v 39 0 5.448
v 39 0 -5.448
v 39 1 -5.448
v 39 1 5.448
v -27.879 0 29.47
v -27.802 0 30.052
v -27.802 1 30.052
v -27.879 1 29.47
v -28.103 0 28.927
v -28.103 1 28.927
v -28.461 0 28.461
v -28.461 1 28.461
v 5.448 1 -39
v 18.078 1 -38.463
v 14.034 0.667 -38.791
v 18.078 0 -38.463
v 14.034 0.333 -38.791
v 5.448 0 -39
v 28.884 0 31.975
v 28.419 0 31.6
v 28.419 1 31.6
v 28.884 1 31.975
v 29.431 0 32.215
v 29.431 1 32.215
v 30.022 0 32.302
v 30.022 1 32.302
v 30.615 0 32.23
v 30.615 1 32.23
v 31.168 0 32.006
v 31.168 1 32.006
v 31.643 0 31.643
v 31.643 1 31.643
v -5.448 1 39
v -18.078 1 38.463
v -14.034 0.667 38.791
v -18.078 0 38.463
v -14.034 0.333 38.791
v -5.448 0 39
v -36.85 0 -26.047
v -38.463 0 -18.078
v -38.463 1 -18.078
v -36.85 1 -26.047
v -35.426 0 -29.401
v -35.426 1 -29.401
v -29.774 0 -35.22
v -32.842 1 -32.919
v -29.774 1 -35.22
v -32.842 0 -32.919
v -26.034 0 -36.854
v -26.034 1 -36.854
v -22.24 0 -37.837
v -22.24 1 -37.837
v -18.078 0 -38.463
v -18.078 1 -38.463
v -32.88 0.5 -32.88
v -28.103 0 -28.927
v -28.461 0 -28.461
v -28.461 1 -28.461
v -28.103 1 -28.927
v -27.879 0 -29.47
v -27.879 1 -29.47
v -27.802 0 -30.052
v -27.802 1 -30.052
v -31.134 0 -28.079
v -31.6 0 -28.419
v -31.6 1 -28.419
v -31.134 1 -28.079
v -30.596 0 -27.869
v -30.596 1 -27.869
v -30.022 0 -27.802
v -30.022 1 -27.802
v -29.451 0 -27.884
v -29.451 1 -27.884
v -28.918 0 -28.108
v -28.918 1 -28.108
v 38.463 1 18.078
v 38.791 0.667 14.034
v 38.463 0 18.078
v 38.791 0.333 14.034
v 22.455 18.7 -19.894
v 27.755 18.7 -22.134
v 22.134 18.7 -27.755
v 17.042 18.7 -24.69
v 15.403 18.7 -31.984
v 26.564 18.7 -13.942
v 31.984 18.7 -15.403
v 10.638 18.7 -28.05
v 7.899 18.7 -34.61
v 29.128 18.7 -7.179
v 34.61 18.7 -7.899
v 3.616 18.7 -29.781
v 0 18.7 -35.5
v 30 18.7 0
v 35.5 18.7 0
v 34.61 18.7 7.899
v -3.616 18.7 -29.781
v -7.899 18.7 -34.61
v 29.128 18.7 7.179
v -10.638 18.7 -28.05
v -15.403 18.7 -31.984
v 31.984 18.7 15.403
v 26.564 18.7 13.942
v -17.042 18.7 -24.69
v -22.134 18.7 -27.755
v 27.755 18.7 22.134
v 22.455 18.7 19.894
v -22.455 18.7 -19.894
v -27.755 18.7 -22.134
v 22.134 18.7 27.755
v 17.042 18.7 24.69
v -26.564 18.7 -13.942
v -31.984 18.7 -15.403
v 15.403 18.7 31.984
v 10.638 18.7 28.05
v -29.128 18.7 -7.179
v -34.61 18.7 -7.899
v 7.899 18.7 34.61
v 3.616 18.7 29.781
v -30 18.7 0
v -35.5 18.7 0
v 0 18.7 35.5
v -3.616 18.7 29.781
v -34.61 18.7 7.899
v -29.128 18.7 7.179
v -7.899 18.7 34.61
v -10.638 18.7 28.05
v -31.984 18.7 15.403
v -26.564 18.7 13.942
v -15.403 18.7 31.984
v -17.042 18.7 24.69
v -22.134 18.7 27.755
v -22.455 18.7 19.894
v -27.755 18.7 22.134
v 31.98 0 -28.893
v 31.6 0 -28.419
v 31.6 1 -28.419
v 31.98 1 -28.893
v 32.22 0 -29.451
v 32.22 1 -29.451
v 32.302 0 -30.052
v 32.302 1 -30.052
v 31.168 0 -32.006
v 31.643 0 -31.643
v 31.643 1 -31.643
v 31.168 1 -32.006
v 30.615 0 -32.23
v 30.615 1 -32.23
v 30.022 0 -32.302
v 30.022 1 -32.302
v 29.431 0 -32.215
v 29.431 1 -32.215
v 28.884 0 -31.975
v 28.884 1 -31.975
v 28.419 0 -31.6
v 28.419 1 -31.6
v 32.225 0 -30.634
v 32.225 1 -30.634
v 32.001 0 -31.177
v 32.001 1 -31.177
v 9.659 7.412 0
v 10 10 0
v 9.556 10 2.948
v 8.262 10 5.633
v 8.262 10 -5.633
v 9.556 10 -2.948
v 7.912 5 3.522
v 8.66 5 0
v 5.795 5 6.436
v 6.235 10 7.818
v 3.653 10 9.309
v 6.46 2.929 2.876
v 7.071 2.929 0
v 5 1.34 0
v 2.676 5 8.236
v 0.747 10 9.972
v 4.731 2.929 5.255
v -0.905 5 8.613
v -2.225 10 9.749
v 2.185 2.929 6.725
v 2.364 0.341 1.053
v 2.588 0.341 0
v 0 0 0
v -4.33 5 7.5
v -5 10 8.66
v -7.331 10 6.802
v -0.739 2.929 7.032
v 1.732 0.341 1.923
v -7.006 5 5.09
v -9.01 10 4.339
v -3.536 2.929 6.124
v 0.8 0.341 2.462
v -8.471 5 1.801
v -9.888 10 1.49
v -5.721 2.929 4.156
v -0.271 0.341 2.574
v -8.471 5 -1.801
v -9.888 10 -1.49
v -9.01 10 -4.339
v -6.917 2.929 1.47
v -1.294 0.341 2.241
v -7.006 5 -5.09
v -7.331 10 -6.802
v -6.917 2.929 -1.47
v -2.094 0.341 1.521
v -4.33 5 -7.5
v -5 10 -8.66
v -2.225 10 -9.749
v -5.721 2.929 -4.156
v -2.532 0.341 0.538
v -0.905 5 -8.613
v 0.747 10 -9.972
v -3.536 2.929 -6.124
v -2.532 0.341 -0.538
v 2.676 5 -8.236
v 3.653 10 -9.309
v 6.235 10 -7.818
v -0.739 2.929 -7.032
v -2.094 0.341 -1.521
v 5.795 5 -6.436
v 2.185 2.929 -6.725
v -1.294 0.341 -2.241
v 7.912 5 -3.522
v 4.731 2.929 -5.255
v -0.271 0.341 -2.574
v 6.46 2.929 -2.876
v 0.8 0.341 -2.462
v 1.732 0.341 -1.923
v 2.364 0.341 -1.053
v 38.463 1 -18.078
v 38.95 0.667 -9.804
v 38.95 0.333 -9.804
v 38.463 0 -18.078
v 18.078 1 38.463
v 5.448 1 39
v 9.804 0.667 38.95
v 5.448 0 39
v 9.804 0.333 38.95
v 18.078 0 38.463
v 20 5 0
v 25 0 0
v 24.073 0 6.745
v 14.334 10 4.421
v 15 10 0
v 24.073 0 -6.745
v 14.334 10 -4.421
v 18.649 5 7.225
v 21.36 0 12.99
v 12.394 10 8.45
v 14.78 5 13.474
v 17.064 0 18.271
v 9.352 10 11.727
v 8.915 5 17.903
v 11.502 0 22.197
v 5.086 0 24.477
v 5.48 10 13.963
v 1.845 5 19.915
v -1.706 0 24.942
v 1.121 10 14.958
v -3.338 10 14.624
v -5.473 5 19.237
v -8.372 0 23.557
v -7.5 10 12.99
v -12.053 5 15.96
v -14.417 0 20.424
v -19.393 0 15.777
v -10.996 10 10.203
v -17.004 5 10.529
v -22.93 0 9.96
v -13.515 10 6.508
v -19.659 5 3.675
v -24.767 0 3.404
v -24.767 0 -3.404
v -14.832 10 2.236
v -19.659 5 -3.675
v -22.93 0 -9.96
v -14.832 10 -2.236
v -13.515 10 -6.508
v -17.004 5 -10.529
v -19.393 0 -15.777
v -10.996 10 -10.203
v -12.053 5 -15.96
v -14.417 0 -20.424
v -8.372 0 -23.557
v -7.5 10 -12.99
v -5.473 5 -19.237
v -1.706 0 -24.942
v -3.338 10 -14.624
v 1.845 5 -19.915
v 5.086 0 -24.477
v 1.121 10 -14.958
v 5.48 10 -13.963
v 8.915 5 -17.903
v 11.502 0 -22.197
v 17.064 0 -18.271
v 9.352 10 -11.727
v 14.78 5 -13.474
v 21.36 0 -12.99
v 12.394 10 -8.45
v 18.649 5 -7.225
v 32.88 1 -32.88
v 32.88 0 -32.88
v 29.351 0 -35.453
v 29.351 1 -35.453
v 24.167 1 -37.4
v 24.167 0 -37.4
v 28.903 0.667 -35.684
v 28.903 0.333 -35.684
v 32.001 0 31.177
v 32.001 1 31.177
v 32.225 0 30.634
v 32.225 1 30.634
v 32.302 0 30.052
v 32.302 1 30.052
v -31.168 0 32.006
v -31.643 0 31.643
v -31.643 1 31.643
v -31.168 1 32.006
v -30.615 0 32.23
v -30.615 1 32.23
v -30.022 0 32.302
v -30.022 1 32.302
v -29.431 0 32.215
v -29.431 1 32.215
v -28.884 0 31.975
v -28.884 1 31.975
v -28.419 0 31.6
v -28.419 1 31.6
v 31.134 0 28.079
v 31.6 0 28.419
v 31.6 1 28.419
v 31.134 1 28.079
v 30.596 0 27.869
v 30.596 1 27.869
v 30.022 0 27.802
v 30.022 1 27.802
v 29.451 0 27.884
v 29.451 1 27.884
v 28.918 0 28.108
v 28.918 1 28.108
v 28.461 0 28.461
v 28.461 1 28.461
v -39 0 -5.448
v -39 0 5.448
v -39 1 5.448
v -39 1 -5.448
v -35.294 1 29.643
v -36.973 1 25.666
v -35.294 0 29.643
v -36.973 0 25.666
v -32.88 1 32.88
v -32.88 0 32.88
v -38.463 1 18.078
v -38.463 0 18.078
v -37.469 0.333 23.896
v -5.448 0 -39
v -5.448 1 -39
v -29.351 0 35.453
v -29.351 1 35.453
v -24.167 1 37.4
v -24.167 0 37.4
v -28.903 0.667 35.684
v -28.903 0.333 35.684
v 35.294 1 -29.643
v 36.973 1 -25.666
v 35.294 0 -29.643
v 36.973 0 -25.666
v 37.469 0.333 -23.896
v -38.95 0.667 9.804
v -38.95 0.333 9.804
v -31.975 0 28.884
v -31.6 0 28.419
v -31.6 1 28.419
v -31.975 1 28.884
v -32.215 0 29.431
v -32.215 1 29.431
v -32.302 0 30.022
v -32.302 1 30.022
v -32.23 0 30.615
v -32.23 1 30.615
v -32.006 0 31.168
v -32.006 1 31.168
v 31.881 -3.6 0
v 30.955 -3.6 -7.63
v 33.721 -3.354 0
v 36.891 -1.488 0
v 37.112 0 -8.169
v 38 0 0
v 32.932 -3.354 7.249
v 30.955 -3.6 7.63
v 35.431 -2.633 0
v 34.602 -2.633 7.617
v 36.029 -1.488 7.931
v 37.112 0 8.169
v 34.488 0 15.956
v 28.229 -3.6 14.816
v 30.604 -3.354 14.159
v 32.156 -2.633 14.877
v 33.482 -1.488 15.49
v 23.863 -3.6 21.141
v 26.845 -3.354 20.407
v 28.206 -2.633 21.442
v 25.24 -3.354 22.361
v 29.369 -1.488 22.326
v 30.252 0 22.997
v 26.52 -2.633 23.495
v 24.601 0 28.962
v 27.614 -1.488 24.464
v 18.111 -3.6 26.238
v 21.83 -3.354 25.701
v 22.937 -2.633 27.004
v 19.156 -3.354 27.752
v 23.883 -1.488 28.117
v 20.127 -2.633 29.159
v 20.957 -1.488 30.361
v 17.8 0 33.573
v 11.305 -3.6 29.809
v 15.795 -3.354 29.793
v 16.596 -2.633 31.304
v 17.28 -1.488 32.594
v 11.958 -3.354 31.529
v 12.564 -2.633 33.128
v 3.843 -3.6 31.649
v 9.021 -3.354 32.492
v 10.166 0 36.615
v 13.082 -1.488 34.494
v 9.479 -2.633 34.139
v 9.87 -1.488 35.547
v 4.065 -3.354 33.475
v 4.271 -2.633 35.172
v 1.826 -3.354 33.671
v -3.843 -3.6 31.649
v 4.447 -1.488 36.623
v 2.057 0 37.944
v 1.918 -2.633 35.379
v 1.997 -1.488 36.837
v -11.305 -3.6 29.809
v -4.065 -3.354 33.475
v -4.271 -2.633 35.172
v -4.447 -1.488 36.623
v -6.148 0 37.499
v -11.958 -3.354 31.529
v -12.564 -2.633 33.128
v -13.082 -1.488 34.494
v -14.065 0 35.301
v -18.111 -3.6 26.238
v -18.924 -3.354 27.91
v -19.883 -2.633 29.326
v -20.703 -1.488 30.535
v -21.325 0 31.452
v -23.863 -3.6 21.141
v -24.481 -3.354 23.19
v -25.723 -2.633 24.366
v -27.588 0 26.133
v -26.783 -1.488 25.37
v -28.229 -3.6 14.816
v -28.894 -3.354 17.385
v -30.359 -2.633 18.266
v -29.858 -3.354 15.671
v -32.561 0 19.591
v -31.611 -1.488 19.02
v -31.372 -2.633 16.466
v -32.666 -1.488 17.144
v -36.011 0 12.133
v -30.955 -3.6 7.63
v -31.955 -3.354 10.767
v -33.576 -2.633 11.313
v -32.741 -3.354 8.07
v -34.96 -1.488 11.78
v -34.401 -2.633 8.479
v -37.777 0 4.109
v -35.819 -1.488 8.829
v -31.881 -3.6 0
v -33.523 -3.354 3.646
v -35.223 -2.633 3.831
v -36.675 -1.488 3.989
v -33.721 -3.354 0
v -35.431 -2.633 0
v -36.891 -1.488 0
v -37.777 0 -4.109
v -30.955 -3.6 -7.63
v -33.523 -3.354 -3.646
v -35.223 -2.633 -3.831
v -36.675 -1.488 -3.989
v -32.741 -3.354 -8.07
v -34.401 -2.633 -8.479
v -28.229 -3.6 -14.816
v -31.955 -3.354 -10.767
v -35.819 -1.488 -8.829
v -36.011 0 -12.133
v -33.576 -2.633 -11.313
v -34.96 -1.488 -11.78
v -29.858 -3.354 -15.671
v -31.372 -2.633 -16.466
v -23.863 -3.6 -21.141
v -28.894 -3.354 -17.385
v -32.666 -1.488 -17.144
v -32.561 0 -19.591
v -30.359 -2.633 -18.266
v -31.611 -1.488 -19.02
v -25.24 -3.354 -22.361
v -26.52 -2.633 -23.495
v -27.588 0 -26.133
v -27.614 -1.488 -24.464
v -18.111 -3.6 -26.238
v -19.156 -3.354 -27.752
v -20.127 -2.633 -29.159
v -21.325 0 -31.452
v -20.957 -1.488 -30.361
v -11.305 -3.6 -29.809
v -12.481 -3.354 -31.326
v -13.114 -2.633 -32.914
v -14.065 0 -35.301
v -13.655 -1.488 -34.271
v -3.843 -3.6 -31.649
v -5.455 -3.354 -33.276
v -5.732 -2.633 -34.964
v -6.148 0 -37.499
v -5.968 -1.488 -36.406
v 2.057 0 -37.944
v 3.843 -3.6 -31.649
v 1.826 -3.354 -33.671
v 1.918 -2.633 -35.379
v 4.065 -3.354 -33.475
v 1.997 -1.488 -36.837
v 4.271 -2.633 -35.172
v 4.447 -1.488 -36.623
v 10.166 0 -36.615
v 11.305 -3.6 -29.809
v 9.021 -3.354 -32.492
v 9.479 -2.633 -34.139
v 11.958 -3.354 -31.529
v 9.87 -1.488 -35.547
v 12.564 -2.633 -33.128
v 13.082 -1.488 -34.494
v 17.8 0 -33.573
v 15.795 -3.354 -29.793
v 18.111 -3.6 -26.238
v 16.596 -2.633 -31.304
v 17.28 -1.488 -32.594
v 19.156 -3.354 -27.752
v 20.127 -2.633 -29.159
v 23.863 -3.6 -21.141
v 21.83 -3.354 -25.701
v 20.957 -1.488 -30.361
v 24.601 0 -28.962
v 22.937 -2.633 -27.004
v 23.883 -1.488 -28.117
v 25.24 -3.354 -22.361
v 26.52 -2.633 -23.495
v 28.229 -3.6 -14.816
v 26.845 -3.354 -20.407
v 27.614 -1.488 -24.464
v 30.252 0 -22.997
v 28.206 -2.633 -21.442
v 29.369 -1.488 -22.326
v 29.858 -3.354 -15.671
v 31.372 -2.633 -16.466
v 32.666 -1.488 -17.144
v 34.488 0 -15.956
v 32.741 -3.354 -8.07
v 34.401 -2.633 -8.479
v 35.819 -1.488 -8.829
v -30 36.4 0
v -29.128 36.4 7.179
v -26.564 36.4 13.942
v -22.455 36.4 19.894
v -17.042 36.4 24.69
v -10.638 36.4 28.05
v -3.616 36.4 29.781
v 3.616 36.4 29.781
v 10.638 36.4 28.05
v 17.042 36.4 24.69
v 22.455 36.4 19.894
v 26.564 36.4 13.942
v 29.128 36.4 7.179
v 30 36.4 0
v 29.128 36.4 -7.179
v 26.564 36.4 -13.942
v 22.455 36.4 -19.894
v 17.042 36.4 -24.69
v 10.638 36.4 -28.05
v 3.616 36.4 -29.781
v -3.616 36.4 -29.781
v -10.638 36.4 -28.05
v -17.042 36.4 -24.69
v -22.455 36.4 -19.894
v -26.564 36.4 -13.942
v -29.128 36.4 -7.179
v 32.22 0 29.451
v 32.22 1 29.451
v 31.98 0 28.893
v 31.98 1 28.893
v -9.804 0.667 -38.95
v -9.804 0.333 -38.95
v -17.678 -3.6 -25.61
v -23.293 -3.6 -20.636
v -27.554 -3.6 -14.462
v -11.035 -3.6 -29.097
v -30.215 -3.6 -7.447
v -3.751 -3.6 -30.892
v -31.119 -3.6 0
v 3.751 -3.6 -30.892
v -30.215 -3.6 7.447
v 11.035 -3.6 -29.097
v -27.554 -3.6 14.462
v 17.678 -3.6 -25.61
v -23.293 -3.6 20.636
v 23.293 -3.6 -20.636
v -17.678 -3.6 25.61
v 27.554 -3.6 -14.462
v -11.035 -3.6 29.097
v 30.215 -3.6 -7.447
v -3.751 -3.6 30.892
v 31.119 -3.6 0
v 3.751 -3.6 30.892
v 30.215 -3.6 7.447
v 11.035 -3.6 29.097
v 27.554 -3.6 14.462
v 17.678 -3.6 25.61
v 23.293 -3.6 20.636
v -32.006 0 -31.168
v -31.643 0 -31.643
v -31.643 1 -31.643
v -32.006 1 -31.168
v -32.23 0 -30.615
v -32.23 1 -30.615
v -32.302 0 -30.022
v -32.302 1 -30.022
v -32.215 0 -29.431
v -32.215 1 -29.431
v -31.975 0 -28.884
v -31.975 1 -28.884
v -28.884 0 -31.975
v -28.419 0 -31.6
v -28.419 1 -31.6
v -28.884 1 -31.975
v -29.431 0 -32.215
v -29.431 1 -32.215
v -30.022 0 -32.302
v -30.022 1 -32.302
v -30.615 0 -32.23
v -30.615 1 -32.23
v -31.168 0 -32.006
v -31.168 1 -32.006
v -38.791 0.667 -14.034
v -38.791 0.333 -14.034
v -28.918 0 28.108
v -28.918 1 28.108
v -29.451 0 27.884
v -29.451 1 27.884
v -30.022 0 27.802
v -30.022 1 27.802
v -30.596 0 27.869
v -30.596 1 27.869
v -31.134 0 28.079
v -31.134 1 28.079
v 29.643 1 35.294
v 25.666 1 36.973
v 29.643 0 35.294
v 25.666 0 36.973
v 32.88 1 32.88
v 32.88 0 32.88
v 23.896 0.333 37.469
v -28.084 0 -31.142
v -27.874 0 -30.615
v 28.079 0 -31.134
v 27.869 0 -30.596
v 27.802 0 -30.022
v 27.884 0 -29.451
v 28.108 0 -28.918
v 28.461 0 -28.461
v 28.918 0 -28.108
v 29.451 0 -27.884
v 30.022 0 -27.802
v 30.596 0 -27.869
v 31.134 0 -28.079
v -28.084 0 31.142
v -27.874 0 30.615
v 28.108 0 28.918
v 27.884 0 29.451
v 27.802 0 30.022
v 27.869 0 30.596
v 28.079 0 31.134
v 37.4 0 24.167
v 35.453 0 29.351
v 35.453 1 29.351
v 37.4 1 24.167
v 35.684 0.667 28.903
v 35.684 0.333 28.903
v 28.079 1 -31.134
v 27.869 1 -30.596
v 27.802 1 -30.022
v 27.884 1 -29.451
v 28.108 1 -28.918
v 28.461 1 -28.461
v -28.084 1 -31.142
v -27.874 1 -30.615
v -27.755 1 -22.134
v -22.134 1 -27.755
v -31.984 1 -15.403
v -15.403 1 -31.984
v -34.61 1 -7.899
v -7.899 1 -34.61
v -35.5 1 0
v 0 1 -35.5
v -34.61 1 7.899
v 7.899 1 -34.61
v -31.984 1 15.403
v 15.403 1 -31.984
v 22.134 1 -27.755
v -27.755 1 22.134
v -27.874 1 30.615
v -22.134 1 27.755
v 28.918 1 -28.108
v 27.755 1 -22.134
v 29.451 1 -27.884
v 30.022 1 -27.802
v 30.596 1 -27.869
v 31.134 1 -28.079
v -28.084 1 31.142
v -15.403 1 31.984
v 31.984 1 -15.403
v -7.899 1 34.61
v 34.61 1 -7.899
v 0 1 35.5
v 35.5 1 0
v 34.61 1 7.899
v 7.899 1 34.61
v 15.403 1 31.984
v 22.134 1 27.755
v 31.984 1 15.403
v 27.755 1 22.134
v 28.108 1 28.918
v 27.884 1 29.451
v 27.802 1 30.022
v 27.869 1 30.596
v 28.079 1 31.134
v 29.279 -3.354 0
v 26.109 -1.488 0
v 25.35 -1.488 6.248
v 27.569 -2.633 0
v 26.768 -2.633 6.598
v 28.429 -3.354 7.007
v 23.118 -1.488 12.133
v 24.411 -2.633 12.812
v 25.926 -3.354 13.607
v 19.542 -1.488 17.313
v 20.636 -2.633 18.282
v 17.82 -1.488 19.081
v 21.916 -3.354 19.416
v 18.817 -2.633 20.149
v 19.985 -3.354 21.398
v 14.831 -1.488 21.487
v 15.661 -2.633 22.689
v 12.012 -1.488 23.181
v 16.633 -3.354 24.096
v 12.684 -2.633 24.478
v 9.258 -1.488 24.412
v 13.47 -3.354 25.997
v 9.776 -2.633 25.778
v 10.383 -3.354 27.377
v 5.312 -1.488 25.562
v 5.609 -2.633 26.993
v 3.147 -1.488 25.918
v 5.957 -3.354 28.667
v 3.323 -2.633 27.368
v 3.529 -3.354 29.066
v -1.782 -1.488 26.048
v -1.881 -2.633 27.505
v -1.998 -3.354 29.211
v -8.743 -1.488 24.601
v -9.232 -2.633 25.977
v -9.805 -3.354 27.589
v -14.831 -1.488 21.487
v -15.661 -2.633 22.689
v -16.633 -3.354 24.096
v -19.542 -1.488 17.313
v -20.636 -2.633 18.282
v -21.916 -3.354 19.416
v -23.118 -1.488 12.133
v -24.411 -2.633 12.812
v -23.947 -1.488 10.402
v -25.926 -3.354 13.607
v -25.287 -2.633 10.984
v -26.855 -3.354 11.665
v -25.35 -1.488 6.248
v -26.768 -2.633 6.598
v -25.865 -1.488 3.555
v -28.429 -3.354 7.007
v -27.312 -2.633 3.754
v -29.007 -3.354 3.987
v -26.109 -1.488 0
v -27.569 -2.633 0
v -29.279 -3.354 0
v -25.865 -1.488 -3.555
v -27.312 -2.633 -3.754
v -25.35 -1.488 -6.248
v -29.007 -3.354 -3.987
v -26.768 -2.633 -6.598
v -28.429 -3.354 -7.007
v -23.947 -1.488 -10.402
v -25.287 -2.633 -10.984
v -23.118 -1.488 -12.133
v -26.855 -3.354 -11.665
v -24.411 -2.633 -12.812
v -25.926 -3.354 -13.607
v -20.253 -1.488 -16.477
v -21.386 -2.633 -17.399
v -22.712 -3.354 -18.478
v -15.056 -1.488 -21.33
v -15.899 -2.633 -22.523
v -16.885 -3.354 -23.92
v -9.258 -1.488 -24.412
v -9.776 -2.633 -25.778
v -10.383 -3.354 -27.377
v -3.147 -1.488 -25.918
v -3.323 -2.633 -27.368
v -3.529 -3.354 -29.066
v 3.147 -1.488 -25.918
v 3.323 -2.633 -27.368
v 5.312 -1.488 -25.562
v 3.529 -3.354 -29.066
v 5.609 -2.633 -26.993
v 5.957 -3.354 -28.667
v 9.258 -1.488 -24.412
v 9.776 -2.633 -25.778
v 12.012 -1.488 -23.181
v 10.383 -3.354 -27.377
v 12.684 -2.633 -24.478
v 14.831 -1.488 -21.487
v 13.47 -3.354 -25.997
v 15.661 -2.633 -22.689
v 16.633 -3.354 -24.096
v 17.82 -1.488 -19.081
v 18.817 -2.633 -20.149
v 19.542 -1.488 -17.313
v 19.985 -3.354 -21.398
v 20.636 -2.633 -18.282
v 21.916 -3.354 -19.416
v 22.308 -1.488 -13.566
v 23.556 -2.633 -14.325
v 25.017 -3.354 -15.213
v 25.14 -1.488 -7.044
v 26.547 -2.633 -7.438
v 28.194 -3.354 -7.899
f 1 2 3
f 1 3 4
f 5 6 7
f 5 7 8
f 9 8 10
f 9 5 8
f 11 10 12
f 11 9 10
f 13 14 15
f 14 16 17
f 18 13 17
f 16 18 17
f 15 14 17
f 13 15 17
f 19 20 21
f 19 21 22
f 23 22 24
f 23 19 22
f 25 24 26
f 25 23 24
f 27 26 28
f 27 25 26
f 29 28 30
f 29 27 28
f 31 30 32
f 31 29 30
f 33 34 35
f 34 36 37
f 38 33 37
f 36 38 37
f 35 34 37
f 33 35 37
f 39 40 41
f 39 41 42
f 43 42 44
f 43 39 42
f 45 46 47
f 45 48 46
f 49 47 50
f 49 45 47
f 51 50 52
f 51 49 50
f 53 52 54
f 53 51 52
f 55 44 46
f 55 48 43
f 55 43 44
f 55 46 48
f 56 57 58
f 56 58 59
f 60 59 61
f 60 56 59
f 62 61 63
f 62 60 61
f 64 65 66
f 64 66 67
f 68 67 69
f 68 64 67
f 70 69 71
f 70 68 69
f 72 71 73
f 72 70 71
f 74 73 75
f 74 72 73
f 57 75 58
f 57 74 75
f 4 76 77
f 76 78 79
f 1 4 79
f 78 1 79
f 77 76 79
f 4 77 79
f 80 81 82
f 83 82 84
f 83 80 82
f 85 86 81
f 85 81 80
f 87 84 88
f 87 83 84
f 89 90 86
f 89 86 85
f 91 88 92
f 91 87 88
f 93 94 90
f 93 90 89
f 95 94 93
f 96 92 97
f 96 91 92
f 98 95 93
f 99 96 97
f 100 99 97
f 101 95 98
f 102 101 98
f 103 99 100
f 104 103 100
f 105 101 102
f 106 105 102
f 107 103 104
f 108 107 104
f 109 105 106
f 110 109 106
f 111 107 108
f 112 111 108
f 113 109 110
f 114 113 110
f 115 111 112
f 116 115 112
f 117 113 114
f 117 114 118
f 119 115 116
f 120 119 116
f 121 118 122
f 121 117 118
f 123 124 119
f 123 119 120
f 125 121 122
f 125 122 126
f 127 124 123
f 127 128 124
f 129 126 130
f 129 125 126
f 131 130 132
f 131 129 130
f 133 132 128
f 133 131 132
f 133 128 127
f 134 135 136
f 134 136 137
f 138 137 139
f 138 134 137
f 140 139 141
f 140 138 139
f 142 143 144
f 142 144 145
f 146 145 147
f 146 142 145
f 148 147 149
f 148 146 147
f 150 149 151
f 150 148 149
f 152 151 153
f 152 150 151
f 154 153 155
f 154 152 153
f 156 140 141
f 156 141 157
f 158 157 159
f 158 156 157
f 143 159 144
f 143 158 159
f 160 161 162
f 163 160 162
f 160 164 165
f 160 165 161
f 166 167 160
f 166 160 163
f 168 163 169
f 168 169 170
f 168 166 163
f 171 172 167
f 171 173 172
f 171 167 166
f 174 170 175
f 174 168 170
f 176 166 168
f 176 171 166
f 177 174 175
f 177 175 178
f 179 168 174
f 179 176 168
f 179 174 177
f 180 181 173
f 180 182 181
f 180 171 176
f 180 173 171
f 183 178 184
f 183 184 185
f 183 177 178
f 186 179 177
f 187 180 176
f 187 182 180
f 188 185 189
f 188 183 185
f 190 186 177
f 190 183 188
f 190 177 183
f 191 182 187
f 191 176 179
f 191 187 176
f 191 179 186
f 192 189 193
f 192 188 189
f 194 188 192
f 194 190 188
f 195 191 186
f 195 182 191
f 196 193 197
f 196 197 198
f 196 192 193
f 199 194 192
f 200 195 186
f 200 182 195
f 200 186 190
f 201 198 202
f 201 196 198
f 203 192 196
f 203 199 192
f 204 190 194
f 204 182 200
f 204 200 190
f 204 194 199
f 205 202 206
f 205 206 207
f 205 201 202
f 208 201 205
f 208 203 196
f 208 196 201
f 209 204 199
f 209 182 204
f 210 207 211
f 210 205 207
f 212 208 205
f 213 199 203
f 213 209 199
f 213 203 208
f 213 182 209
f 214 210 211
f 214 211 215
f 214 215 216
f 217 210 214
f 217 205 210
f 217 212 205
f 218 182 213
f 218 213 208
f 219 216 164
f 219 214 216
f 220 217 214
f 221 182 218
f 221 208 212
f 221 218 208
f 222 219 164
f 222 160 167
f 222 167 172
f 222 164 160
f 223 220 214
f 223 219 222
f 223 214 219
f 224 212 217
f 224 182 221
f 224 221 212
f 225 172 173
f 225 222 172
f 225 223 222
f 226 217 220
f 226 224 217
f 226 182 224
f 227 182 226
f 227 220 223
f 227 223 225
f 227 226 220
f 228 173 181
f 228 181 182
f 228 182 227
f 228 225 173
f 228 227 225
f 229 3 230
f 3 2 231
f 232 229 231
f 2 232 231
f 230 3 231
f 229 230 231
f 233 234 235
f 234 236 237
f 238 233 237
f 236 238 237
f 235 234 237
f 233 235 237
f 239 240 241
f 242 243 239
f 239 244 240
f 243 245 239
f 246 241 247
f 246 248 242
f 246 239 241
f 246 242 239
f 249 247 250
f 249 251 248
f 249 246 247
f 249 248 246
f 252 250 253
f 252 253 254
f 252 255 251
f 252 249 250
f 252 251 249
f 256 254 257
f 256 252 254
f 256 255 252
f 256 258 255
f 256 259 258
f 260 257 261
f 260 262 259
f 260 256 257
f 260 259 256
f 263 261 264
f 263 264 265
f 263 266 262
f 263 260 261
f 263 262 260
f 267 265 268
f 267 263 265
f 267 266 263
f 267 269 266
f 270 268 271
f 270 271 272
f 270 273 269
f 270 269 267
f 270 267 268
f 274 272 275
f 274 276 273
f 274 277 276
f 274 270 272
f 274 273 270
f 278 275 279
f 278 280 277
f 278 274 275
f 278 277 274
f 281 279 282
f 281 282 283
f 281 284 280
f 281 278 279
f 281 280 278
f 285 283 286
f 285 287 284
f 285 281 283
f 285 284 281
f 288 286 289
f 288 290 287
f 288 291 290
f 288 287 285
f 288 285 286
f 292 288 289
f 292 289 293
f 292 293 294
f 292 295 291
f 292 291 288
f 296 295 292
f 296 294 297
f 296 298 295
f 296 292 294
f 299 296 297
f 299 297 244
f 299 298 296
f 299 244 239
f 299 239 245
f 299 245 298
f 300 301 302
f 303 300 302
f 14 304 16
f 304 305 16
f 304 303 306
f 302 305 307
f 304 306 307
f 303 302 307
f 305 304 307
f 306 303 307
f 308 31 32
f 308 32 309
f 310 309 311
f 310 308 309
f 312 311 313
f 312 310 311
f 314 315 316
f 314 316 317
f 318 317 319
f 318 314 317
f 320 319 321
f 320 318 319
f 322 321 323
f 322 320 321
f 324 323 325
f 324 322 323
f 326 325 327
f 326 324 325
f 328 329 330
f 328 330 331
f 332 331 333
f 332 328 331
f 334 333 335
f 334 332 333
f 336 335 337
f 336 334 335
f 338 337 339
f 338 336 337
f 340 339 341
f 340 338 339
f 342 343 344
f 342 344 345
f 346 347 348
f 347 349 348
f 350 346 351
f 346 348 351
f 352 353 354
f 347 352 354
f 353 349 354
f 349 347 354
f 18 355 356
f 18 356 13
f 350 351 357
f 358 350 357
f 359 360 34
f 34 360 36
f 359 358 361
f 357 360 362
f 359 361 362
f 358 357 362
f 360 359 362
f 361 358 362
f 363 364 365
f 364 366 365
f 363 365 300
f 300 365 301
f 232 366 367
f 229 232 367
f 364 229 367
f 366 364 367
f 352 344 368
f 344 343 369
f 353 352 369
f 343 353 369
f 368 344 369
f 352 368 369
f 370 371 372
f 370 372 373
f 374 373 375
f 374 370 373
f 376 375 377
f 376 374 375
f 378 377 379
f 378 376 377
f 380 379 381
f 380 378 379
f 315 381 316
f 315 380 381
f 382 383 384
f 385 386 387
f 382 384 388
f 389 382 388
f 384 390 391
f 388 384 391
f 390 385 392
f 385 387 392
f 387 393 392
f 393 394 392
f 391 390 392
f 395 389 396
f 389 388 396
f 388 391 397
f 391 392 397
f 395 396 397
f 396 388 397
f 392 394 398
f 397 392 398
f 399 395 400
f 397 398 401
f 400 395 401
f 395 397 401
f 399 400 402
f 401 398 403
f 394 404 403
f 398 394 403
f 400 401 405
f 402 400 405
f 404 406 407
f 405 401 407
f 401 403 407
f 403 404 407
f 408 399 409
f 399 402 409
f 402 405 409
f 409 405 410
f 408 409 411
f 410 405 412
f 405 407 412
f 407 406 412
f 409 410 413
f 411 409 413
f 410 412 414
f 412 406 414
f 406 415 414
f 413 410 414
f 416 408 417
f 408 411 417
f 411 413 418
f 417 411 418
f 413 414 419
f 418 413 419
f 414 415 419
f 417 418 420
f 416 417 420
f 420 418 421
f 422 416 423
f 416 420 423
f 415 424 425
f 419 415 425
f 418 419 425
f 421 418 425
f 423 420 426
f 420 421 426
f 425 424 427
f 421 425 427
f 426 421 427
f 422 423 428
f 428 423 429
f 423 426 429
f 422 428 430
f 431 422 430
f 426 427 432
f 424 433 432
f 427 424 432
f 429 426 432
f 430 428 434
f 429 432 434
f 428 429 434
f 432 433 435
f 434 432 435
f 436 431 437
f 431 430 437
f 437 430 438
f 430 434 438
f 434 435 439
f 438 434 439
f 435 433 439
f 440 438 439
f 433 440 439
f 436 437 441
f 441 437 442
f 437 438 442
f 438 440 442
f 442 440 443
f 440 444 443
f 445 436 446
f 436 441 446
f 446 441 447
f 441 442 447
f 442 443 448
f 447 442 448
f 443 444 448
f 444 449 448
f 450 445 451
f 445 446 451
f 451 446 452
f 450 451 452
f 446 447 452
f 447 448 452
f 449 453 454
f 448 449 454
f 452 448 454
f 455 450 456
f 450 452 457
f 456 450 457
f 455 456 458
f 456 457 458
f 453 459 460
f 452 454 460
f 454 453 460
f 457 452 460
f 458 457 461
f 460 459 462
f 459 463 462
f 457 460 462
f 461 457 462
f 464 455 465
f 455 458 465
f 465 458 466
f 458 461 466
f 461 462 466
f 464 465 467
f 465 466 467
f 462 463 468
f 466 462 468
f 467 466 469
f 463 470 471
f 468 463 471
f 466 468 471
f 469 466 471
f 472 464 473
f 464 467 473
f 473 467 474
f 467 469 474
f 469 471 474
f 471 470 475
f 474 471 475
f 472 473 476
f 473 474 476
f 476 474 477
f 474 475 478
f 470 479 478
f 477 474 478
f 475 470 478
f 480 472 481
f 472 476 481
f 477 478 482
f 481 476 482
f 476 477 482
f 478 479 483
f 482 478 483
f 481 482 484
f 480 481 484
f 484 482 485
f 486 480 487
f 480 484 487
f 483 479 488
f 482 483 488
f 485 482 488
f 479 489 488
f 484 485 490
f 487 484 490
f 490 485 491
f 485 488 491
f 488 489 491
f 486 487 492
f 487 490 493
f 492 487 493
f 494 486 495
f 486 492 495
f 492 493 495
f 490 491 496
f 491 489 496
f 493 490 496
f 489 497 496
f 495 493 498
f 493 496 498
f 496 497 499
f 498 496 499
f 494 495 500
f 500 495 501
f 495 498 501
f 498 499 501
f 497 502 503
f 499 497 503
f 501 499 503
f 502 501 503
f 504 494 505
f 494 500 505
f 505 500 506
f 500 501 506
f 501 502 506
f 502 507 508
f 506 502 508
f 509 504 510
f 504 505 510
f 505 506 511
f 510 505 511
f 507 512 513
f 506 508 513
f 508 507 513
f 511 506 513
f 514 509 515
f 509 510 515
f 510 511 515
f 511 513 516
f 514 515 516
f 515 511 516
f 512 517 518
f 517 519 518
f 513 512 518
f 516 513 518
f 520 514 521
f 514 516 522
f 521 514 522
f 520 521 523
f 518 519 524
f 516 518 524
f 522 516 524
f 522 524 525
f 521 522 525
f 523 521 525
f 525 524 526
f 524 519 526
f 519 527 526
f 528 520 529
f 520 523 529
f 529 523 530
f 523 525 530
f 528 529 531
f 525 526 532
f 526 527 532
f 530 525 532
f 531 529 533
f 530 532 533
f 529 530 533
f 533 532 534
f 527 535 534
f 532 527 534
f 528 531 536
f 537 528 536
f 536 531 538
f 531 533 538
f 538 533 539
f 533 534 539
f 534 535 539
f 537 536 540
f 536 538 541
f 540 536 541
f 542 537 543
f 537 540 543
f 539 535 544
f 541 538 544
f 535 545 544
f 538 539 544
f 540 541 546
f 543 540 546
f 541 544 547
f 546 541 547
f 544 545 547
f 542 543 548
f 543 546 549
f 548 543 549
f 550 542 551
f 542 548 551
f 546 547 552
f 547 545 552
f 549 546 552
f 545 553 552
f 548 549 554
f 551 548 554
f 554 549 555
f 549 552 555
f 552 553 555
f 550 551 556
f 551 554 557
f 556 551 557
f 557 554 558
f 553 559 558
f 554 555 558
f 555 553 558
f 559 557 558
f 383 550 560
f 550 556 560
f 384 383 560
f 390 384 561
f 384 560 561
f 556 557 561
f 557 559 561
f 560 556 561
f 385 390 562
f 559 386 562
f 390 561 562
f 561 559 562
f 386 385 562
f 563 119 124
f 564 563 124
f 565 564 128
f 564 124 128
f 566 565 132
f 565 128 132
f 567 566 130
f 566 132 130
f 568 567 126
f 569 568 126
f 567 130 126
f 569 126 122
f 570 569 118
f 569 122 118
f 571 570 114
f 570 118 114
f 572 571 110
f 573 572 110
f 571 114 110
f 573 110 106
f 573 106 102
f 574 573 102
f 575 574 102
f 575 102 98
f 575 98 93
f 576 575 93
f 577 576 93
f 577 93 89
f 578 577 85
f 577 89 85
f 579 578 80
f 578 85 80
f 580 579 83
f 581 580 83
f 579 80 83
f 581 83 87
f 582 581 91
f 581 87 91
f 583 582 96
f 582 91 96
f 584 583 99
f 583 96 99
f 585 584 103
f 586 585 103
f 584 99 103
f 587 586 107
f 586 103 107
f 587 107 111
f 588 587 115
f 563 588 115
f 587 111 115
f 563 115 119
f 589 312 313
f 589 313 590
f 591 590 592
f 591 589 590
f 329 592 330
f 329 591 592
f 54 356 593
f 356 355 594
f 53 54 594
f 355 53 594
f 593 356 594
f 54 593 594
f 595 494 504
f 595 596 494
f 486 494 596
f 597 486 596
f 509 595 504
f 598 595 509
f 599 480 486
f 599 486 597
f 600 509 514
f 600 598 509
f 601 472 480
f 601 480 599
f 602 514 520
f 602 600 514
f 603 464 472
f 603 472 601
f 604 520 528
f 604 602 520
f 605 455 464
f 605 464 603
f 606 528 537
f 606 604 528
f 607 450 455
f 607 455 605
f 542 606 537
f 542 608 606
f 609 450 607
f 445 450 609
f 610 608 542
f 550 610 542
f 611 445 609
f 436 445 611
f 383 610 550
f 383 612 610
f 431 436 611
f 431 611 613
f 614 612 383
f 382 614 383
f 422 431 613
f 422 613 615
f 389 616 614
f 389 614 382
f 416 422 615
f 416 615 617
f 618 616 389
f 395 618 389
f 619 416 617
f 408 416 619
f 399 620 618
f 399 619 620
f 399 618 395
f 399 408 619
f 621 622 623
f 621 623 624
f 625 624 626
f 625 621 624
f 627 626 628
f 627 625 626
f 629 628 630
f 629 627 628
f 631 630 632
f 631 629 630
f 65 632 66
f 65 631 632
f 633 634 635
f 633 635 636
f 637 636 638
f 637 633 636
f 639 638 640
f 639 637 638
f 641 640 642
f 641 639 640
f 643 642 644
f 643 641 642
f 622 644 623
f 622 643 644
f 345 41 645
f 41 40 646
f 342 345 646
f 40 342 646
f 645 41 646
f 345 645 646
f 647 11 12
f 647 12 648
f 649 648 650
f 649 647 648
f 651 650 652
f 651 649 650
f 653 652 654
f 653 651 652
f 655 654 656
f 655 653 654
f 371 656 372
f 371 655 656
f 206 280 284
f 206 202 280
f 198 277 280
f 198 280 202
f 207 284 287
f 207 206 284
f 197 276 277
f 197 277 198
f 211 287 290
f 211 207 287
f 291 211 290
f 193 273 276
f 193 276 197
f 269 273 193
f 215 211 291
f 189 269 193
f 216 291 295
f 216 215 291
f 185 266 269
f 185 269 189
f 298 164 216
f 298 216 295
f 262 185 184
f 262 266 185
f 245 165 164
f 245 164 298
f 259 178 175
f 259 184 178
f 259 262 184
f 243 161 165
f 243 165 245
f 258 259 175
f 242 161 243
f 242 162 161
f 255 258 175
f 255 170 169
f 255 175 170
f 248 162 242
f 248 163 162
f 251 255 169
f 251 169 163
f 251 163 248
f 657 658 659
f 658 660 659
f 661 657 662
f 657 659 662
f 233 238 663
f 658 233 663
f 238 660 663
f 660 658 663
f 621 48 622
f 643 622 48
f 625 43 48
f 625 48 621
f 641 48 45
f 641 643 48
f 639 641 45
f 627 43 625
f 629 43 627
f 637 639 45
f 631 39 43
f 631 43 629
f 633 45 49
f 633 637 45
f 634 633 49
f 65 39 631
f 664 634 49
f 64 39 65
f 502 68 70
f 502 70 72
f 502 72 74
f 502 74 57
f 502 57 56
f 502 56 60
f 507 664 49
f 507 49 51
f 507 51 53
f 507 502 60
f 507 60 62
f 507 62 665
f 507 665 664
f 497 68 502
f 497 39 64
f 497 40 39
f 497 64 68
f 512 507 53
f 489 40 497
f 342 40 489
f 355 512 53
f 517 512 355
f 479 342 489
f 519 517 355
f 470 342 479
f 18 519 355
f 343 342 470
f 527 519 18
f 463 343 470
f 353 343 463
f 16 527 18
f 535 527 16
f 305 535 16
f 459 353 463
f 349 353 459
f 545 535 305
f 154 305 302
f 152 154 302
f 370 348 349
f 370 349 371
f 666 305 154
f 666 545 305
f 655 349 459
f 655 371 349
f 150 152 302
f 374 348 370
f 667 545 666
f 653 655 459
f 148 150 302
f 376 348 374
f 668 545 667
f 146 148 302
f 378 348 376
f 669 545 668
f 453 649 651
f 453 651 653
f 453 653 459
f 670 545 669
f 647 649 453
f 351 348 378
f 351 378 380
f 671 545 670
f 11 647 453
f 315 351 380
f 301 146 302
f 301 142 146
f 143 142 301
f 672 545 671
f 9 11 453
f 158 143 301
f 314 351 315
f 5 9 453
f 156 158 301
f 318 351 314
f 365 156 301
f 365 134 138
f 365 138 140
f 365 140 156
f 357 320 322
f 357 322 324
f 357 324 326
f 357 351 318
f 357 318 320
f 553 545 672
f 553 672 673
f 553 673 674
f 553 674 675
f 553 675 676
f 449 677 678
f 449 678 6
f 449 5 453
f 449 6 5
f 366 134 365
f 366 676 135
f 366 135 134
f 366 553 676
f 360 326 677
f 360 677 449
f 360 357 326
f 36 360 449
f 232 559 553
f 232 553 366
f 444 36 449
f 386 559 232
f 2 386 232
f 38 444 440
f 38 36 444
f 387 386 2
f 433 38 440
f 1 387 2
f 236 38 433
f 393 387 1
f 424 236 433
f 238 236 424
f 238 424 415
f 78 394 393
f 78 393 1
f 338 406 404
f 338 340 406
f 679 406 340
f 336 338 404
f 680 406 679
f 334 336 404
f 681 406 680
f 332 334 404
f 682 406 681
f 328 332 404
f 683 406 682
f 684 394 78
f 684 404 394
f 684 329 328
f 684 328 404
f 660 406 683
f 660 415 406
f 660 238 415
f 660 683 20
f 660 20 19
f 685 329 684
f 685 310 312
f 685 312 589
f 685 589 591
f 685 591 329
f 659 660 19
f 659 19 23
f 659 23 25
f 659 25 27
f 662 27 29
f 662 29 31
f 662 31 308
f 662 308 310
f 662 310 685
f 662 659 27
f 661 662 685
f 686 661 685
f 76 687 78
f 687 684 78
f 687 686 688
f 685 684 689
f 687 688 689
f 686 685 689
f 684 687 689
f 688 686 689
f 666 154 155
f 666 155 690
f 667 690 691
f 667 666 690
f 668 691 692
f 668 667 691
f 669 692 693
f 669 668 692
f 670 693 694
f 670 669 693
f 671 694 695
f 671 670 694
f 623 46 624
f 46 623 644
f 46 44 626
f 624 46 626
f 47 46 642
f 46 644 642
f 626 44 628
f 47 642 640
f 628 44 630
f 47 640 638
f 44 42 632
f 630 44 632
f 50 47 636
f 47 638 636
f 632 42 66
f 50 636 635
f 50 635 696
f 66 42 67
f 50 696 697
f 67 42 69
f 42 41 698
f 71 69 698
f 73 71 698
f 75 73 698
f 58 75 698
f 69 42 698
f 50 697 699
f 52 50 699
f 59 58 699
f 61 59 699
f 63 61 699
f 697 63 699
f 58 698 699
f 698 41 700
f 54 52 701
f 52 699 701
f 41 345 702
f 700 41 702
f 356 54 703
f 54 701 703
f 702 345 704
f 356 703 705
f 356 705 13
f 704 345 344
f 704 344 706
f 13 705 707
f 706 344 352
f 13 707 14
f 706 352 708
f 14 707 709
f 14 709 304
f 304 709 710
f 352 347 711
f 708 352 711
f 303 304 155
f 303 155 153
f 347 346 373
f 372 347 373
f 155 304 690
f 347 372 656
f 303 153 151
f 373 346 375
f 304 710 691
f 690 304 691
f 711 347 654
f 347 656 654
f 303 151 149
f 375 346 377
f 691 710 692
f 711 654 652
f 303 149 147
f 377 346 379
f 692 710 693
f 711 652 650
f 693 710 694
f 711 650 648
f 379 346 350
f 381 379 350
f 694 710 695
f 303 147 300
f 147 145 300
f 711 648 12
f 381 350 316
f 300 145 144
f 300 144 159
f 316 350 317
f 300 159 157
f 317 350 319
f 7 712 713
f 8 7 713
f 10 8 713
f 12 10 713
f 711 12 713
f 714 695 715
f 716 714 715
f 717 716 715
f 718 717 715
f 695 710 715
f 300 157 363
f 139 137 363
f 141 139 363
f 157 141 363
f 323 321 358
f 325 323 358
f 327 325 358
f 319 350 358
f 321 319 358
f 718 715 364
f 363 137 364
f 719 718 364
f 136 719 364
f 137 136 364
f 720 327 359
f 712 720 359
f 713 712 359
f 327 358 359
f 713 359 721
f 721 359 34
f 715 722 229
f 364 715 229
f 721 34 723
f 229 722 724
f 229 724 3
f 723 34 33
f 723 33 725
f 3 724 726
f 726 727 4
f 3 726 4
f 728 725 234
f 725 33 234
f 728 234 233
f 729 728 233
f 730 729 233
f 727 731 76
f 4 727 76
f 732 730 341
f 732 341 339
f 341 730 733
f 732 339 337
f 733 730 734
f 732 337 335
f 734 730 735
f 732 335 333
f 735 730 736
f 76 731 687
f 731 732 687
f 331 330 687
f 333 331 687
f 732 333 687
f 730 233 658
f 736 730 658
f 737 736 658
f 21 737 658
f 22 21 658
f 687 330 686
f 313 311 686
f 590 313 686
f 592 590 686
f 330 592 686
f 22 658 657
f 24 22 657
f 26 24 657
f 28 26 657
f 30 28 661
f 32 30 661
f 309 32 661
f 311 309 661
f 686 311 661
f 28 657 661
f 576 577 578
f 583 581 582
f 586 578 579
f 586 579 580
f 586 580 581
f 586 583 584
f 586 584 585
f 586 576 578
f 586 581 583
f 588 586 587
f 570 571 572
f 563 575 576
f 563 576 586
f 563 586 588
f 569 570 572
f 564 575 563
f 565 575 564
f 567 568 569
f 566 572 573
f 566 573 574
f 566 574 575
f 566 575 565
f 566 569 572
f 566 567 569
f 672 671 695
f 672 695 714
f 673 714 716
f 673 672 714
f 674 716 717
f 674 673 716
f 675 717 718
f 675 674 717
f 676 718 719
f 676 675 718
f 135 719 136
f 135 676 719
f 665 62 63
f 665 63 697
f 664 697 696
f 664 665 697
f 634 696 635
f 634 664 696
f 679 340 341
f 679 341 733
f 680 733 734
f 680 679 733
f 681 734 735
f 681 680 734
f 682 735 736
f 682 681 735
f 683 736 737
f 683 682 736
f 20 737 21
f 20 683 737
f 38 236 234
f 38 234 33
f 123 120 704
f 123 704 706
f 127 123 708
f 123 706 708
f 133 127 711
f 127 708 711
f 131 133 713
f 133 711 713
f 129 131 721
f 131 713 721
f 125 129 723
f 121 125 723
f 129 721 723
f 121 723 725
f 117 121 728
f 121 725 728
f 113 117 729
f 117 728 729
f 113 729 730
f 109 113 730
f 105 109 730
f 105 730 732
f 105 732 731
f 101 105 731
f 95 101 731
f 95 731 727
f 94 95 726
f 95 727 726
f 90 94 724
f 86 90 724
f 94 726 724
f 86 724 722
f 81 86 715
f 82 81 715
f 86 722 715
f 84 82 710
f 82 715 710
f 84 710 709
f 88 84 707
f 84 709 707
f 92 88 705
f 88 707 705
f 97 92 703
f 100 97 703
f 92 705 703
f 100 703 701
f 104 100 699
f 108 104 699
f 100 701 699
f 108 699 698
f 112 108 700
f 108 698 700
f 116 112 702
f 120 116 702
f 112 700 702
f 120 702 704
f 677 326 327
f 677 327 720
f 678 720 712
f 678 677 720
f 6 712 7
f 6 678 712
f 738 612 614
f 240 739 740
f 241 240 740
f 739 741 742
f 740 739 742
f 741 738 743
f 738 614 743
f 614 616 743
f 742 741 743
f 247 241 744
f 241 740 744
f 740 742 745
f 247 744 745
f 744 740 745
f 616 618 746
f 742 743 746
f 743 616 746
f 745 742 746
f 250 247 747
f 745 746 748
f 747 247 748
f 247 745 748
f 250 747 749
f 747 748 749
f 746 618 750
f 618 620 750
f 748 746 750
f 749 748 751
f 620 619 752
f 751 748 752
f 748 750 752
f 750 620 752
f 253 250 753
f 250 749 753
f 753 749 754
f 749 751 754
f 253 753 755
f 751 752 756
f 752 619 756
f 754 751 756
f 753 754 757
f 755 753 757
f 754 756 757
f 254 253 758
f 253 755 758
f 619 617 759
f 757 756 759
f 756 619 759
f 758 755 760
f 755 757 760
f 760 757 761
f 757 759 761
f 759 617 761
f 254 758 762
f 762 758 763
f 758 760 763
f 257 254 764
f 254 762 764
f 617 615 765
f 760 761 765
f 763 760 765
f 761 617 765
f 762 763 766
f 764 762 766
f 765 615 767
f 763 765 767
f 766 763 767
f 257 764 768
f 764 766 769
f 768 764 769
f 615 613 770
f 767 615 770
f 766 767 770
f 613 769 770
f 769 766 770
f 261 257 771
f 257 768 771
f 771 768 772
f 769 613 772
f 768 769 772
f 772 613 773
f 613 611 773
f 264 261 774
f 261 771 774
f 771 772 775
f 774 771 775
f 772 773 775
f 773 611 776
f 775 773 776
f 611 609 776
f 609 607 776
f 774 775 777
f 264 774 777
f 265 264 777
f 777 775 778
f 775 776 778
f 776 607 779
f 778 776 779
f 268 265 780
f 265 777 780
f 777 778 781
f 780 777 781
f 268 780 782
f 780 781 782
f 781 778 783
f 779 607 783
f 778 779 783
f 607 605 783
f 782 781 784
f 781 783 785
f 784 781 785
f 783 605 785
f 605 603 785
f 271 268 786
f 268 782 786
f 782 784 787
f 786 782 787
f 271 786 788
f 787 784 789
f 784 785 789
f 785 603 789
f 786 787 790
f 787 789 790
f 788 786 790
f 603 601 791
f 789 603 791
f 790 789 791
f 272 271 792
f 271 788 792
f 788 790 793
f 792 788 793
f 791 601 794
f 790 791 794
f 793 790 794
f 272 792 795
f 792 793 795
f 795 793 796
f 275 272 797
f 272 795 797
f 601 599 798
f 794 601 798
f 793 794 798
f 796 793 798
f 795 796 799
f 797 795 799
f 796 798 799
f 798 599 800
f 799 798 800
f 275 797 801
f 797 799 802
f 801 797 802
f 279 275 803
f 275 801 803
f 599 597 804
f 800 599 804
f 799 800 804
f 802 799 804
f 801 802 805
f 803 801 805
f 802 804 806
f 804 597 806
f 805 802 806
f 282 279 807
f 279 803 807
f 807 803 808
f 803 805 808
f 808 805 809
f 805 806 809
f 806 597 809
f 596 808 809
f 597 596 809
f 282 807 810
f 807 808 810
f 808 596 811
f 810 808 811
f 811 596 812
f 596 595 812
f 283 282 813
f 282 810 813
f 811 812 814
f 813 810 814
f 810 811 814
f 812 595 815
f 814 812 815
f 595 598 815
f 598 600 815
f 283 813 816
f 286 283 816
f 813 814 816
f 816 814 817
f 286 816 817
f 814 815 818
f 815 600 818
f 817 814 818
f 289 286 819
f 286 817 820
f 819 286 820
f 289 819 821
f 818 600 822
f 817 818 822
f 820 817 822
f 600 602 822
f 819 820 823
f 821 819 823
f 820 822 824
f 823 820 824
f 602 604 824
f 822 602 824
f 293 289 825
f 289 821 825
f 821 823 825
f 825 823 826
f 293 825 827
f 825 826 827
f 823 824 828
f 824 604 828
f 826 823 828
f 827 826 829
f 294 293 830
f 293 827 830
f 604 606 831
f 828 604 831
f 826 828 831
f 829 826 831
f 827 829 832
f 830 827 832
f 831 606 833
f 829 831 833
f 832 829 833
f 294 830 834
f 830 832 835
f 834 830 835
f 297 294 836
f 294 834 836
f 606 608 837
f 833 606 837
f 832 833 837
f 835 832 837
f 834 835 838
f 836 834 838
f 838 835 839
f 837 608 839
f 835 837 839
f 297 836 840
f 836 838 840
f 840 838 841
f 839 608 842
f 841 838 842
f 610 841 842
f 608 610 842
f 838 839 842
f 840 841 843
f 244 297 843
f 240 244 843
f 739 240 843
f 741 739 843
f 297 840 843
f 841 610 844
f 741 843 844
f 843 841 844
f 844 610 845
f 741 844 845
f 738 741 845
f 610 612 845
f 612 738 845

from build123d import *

# Parameters (mm, degrees)
F1_DEPTH  = 1
F2_R      = 35.5
F3_DEPTH  = 17.7
F4_R      = 30
F5_DEPTH  = 17.7
F6_R      = 25
F7_DEPTH  = 10
F8_R      = 10
F9_DEPTH  = 10
F10_R     = 9.99999
F11_R     = 38
F11_R_2   = 25
F12_DEPTH = 3.6
F13_SIZE  = 9.99999


# Not quite as in the source:
# - a fillet or chamfer that OpenCascade refuses, or shapes differently, is made with other operations: its cross-section is extruded or revolved along the edge and cut away or added
# - a fillet or chamfer is up to 0.001 mm smaller than in the source, because OpenCascade refuses the exact size
# - ends of sketch curves that miss each other by under 0.0002 mm in the source are joined


with BuildPart() as f1:
    # F0 (on Front) → F1 (new body)
    with BuildSketch(Plane.XZ):
        with BuildLine():
            Line((-31.6430284581, 31.6430284581), (-32.8804653252, 32.8804653252))
            add(Edge.make_bspline(
                [(-38.4634802867, 18.0779059693), (-37.7870588122, 24.2282956212), (-36.2701561309, 29.4907744999), (-32.8804653607, 32.8804652897)],
                knots=[0.809263962, 0.809263962, 0.809263962, 0.809263962, 0.875, 0.875, 0.875, 0.875], degree=3))
            ThreePointArc((-38.4634802867, 18.0779059693), (-35.411472746, 23.5005871833), (-31.6003565153, 28.4194909895))
            ThreePointArc((-31.6003565153, 28.4194909895), (-32.3018410876, 30.0222561796), (-31.6430284581, 31.6430284581))
        make_face()
        with BuildLine():
            add(Edge.make_bspline(
                [(-32.8804653607, 32.8804652897), (-29.4907745634, 36.2701561065), (-24.2282956474, 37.7870588046), (-18.077905986, 38.4634802832)],
                knots=[0.875, 0.875, 0.875, 0.875, 0.940736038, 0.940736038, 0.940736038, 0.940736038], degree=3))
            Line((-32.8804653252, 32.8804653252), (-31.6430284581, 31.6430284581))
            ThreePointArc((-31.6430284581, 31.6430284581), (-30.0222561796, 32.3018410876), (-28.4194909895, 31.6003565153))
            ThreePointArc((-28.4194909895, 31.6003565153), (-23.5005871834, 35.411472746), (-18.0779059693, 38.4634802867))
        make_face()
        with BuildLine():
            add(Edge.make_bspline(
                [(-38.4634802867, -18.0779059693), (-38.8960139665, -14.1450759683), (-38.9848843926, -9.8491893154), (-39, -5.4477534527)],
                knots=[0.690736038, 0.690736038, 0.690736038, 0.690736038, 0.7327705557, 0.7327705557, 0.7327705557, 0.7327705557], degree=3))
            ThreePointArc((-38.4634802867, -18.0779059693), (-35.411472746, -23.5005871834), (-31.6003565153, -28.4194909895))
            ThreePointArc((-31.6003565153, -28.4194909895), (-30.0222561796, -27.8022353132), (-28.4610479428, -28.4610479428))
            Line((-28.4610479428, -28.4610479428), (0, 0))
            Line((0, 0), (-28.4610479428, 28.4610479428))
            ThreePointArc((-28.4610479428, 28.4610479428), (-30.0222561796, 27.8022353132), (-31.6003565153, 28.4194909895))
            ThreePointArc((-31.6003565153, 28.4194909895), (-35.411472746, 23.5005871833), (-38.4634802867, 18.0779059693))
            add(Edge.make_bspline(
                [(-39, 5.4477534527), (-38.9848843926, 9.8491893154), (-38.8960139665, 14.1450759683), (-38.4634802867, 18.0779059693)],
                knots=[0.7672294443, 0.7672294443, 0.7672294443, 0.7672294443, 0.809263962, 0.809263962, 0.809263962, 0.809263962], degree=3))
            Line((-39, 5.4477534527), (-39, -2.257e-07))
            Line((-39, -2.257e-07), (-39, -5.4477534527))
        make_face()
        with BuildLine():
            ThreePointArc((28.4194909895, 31.6003565153), (23.5005871834, 35.411472746), (18.0779059693, 38.4634802867))
            add(Edge.make_bspline(
                [(5.4477534527, 39), (9.8491893154, 38.9848843926), (14.1450759683, 38.8960139665), (18.0779059693, 38.4634802867)],
                knots=[0.0172294443, 0.0172294443, 0.0172294443, 0.0172294443, 0.059263962, 0.059263962, 0.059263962, 0.059263962], degree=3))
            Line((5.4477534527, 39), (0, 39))
            Line((0, 39), (-5.4477534527, 39))
            add(Edge.make_bspline(
                [(-18.0779059693, 38.4634802867), (-14.1450759684, 38.8960139665), (-9.8491893154, 38.9848843926), (-5.4477534527, 39)],
                knots=[0.940736038, 0.940736038, 0.940736038, 0.940736038, 0.9827705557, 0.9827705557, 0.9827705557, 0.9827705557], degree=3))
            ThreePointArc((-18.0779059693, 38.4634802867), (-23.5005871834, 35.411472746), (-28.4194909895, 31.6003565153))
            ThreePointArc((-28.4194909895, 31.6003565153), (-27.9620942748, 30.885485492), (-27.8020382004, 30.0520382004))
            ThreePointArc((-27.8020382004, 30.0520382004), (-27.9733092523, 29.1910004776), (-28.4610479428, 28.4610479428))
            Line((-28.4610479428, 28.4610479428), (0, 0))
            Line((0, 0), (28.4610479428, 28.4610479428))
            ThreePointArc((28.4610479428, 28.4610479428), (27.8022353132, 30.0222561796), (28.4194909895, 31.6003565153))
        make_face()
        with BuildLine():
            ThreePointArc((31.6003565153, -28.4194909895), (35.411472746, -23.5005871834), (38.4634802867, -18.0779059693))
            add(Edge.make_bspline(
                [(39, -5.4477534527), (38.9848843926, -9.8491893154), (38.8960139665, -14.1450759683), (38.4634802867, -18.0779059693)],
                knots=[0.2672294443, 0.2672294443, 0.2672294443, 0.2672294443, 0.309263962, 0.309263962, 0.309263962, 0.309263962], degree=3))
            Line((39, -5.4477534527), (39, 6.014e-07))
            Line((39, 6.014e-07), (39, 5.4477534527))
            add(Edge.make_bspline(
                [(38.4634802867, 18.0779059693), (38.8960139665, 14.1450759683), (38.9848843926, 9.8491893154), (39, 5.4477534527)],
                knots=[0.190736038, 0.190736038, 0.190736038, 0.190736038, 0.2327705557, 0.2327705557, 0.2327705557, 0.2327705557], degree=3))
            ThreePointArc((38.4634802867, 18.0779059693), (35.411472746, 23.5005871834), (31.6003565153, 28.4194909895))
            ThreePointArc((31.6003565153, 28.4194909895), (30.0222561796, 27.8022353132), (28.4610479428, 28.4610479428))
            Line((28.4610479428, 28.4610479428), (0, 0))
            Line((0, 0), (28.4610479428, -28.4610479428))
            ThreePointArc((28.4610479428, -28.4610479428), (30.0222561796, -27.8022353132), (31.6003565153, -28.4194909895))
        make_face()
        with BuildLine():
            add(Edge.make_bspline(
                [(18.0779059693, -38.4634802867), (14.1450759683, -38.8960139665), (9.8491893154, -38.9848843926), (5.4477534527, -39)],
                knots=[0.440736038, 0.440736038, 0.440736038, 0.440736038, 0.4827705557, 0.4827705557, 0.4827705557, 0.4827705557], degree=3))
            ThreePointArc((18.0779059693, -38.4634802867), (23.5005871834, -35.411472746), (28.4194909895, -31.6003565153))
            ThreePointArc((28.4194909895, -31.6003565153), (27.8022353132, -30.0222561796), (28.4610479428, -28.4610479428))
            Line((28.4610479428, -28.4610479428), (0, 0))
            Line((0, 0), (-28.4610479428, -28.4610479428))
            ThreePointArc((-28.4610479428, -28.4610479428), (-27.9733092523, -29.1910004776), (-27.8020382004, -30.0520382004))
            ThreePointArc((-27.8020382004, -30.0520382004), (-27.9620942748, -30.885485492), (-28.4194909895, -31.6003565153))
            ThreePointArc((-28.4194909895, -31.6003565153), (-23.5005871834, -35.411472746), (-18.0779059693, -38.4634802867))
            add(Edge.make_bspline(
                [(-5.4477534527, -39), (-9.8491893154, -38.9848843926), (-14.1450759683, -38.8960139665), (-18.0779059693, -38.4634802867)],
                knots=[0.5172294443, 0.5172294443, 0.5172294443, 0.5172294443, 0.559263962, 0.559263962, 0.559263962, 0.559263962], degree=3))
            Line((-5.4477534527, -39), (-6.496e-07, -39))
            Line((-6.496e-07, -39), (5.4477534527, -39))
        make_face()
        with BuildLine():
            add(Edge.make_bspline(
                [(32.8804653252, -32.8804653252), (29.4907745274, -36.2701561229), (24.2282956212, -37.7870588122), (18.0779059693, -38.4634802867)],
                knots=[0.375, 0.375, 0.375, 0.375, 0.440736038, 0.440736038, 0.440736038, 0.440736038], degree=3))
            Line((32.8804653252, -32.8804653252), (31.6430284581, -31.6430284581))
            ThreePointArc((31.6430284581, -31.6430284581), (30.0222561796, -32.3018410876), (28.4194909895, -31.6003565153))
            ThreePointArc((28.4194909895, -31.6003565153), (23.5005871834, -35.411472746), (18.0779059693, -38.4634802867))
        make_face()
        with BuildLine():
            Line((31.6430284581, -31.6430284581), (32.8804653252, -32.8804653252))
            add(Edge.make_bspline(
                [(38.4634802867, -18.0779059693), (37.7870588122, -24.2282956212), (36.2701561229, -29.4907745274), (32.8804653252, -32.8804653252)],
                knots=[0.309263962, 0.309263962, 0.309263962, 0.309263962, 0.375, 0.375, 0.375, 0.375], degree=3))
            ThreePointArc((38.4634802867, -18.0779059693), (35.411472746, -23.5005871834), (31.6003565153, -28.4194909895))
            ThreePointArc((31.6003565153, -28.4194909895), (32.1191879541, -29.1635609099), (32.3020382004, -30.0520382004))
            ThreePointArc((32.3020382004, -30.0520382004), (32.1307671486, -30.9130759232), (31.6430284581, -31.6430284581))
        make_face()
        with BuildLine():
            Line((-31.6430284581, -31.6430284581), (-32.8804653252, -32.8804653252))
            add(Edge.make_bspline(
                [(-18.0779059693, -38.4634802867), (-24.2282956212, -37.7870588122), (-29.4907744533, -36.2701561443), (-32.8804653252, -32.8804653252)],
                knots=[0.559263962, 0.559263962, 0.559263962, 0.559263962, 0.625, 0.625, 0.625, 0.625], degree=3))
            ThreePointArc((-18.0779059693, -38.4634802867), (-23.5005871834, -35.411472746), (-28.4194909895, -31.6003565153))
            ThreePointArc((-28.4194909895, -31.6003565153), (-30.0222561796, -32.3018410876), (-31.6430284581, -31.6430284581))
        make_face()
        with BuildLine():
            add(Edge.make_bspline(
                [(-32.8804652296, -32.8804654207), (-36.2701560789, -29.4907746242), (-37.7870587922, -24.2282957051), (-38.4634802779, -18.0779060371)],
                knots=[0.625, 0.625, 0.625, 0.625, 0.690736038, 0.690736038, 0.690736038, 0.690736038], degree=3))
            Line((-32.8804652296, -32.8804654207), (-31.6430284581, -31.6430284581))
            ThreePointArc((-31.6430284581, -31.6430284581), (-32.3018410876, -30.0222561796), (-31.6003565153, -28.4194909895))
            ThreePointArc((-31.6003565153, -28.4194909895), (-35.411472746, -23.5005871834), (-38.4634802779, -18.0779060371))
        make_face()
        with BuildLine():
            Line((31.6430284581, 31.6430284581), (32.8804653252, 32.8804653252))
            add(Edge.make_bspline(
                [(18.0779059693, 38.4634802867), (24.2282956212, 37.7870588122), (29.4907744654, 36.2701561408), (32.8804653252, 32.8804653252)],
                knots=[0.059263962, 0.059263962, 0.059263962, 0.059263962, 0.125, 0.125, 0.125, 0.125], degree=3))
            ThreePointArc((18.0779059693, 38.4634802867), (23.5005871834, 35.411472746), (28.4194909895, 31.6003565153))
            ThreePointArc((28.4194909895, 31.6003565153), (30.0222561796, 32.3018410876), (31.6430284581, 31.6430284581))
        make_face()
        with BuildLine():
            add(Edge.make_bspline(
                [(32.8804652452, 32.8804654051), (36.2701560861, 29.4907746085), (37.7870587955, 24.2282956914), (38.4634802794, 18.077906026)],
                knots=[0.125, 0.125, 0.125, 0.125, 0.190736038, 0.190736038, 0.190736038, 0.190736038], degree=3))
            Line((32.8804652452, 32.8804654051), (31.6430284581, 31.6430284581))
            ThreePointArc((31.6430284581, 31.6430284581), (32.1307671486, 30.9130759232), (32.3020382004, 30.0520382004))
            ThreePointArc((32.3020382004, 30.0520382004), (32.1191879541, 29.1635609099), (31.6003565153, 28.4194909895))
            ThreePointArc((31.6003565153, 28.4194909895), (35.411472746, 23.5005871834), (38.4634802794, 18.077906026))
        make_face()
    extrude(amount=-F1_DEPTH)

    # F2 (on face) → F3 (join)
    with BuildSketch(Plane(origin=(0, 1, 0), x_dir=(-1, 0, 0), z_dir=(0, 1, 0))):
        Circle(F2_R)
    extrude(amount=F3_DEPTH)

    # F4 (on face) → F5 (join)
    with BuildSketch(Plane(origin=(0, 18.7, 0), x_dir=(-1, 0, 0), z_dir=(0, 1, 0))):
        Circle(F4_R)
    extrude(amount=F5_DEPTH)

    # F6 (on face) → F7 (cut)
    with BuildSketch(Plane.XZ):
        Circle(F6_R)
    extrude(amount=-F7_DEPTH, mode=Mode.SUBTRACT)

    # F8 (on face) → F9 (join)
    with BuildSketch(Plane.XZ.offset(-10)):
        Circle(F8_R)
    extrude(amount=F9_DEPTH)

    # F10 (radius 10 in the source; OpenCascade refuses exactly that, so slightly less here)
    f10_edges = [f1.edges().sort_by_distance(p)[0] for p in [
        (-10, 0, 0),
    ]]
    fillet(f10_edges, radius=F10_R)

    # F11 (on face) → F12 (join)
    with BuildSketch(Plane.XZ):
        Circle(F11_R)
        Circle(F11_R_2, mode=Mode.SUBTRACT)
    extrude(amount=F12_DEPTH)

    # F13 (size 10 in the source; OpenCascade refuses exactly that, so slightly less here)
    f13_edges = [f1.edges().sort_by_distance(p)[0] for p in [
        (-25, 10, 0),
    ]]
    chamfer(f13_edges, length=F13_SIZE)

    # F14: fillet of radius 7 on 2 edges, made by hand

    # F14_s1 → F14_t2 (revolve, cut)
    with BuildSketch(Plane.XY):
        with BuildLine():
            ThreePointArc((31.8811765837, -3.6), (35.4308244535, -2.6332412516), (38, 0))
            Line((38, 0), (38.1223764683, -0.068))
            ThreePointArc((38.1223764683, -0.068), (38.14, -1.8), (38.14, -3.6))
            Line((38.14, -3.6), (38, -3.74))
            Line((38, -3.74), (31.8811765837, -3.74))
            Line((31.8811765837, -3.74), (31.8811765837, -3.6))
        make_face()
    revolve(axis=Axis((0, -3.6, 0), (0, -1, 0)), mode=Mode.SUBTRACT)

    # F14_s3 → F14_t4 (revolve, cut)
    with BuildSketch(Plane.XY):
        with BuildLine():
            ThreePointArc((25, 1e-05), (27.569176173, -2.633238351), (31.1188289729, -3.6))
            Line((31.1188289729, -3.6), (31.1188289729, -3.74))
            Line((31.1188289729, -3.74), (25, -3.74))
            Line((25, -3.74), (24.86, -3.6))
            ThreePointArc((24.86, -3.6), (24.86, -1.799995), (24.8776234205, -0.0679898))
            Line((24.8776234205, -0.0679898), (25, 1e-05))
        make_face()
    revolve(axis=Axis((0, -3.6, 0), (0, -1, 0)), mode=Mode.SUBTRACT)


solid = f1.part
